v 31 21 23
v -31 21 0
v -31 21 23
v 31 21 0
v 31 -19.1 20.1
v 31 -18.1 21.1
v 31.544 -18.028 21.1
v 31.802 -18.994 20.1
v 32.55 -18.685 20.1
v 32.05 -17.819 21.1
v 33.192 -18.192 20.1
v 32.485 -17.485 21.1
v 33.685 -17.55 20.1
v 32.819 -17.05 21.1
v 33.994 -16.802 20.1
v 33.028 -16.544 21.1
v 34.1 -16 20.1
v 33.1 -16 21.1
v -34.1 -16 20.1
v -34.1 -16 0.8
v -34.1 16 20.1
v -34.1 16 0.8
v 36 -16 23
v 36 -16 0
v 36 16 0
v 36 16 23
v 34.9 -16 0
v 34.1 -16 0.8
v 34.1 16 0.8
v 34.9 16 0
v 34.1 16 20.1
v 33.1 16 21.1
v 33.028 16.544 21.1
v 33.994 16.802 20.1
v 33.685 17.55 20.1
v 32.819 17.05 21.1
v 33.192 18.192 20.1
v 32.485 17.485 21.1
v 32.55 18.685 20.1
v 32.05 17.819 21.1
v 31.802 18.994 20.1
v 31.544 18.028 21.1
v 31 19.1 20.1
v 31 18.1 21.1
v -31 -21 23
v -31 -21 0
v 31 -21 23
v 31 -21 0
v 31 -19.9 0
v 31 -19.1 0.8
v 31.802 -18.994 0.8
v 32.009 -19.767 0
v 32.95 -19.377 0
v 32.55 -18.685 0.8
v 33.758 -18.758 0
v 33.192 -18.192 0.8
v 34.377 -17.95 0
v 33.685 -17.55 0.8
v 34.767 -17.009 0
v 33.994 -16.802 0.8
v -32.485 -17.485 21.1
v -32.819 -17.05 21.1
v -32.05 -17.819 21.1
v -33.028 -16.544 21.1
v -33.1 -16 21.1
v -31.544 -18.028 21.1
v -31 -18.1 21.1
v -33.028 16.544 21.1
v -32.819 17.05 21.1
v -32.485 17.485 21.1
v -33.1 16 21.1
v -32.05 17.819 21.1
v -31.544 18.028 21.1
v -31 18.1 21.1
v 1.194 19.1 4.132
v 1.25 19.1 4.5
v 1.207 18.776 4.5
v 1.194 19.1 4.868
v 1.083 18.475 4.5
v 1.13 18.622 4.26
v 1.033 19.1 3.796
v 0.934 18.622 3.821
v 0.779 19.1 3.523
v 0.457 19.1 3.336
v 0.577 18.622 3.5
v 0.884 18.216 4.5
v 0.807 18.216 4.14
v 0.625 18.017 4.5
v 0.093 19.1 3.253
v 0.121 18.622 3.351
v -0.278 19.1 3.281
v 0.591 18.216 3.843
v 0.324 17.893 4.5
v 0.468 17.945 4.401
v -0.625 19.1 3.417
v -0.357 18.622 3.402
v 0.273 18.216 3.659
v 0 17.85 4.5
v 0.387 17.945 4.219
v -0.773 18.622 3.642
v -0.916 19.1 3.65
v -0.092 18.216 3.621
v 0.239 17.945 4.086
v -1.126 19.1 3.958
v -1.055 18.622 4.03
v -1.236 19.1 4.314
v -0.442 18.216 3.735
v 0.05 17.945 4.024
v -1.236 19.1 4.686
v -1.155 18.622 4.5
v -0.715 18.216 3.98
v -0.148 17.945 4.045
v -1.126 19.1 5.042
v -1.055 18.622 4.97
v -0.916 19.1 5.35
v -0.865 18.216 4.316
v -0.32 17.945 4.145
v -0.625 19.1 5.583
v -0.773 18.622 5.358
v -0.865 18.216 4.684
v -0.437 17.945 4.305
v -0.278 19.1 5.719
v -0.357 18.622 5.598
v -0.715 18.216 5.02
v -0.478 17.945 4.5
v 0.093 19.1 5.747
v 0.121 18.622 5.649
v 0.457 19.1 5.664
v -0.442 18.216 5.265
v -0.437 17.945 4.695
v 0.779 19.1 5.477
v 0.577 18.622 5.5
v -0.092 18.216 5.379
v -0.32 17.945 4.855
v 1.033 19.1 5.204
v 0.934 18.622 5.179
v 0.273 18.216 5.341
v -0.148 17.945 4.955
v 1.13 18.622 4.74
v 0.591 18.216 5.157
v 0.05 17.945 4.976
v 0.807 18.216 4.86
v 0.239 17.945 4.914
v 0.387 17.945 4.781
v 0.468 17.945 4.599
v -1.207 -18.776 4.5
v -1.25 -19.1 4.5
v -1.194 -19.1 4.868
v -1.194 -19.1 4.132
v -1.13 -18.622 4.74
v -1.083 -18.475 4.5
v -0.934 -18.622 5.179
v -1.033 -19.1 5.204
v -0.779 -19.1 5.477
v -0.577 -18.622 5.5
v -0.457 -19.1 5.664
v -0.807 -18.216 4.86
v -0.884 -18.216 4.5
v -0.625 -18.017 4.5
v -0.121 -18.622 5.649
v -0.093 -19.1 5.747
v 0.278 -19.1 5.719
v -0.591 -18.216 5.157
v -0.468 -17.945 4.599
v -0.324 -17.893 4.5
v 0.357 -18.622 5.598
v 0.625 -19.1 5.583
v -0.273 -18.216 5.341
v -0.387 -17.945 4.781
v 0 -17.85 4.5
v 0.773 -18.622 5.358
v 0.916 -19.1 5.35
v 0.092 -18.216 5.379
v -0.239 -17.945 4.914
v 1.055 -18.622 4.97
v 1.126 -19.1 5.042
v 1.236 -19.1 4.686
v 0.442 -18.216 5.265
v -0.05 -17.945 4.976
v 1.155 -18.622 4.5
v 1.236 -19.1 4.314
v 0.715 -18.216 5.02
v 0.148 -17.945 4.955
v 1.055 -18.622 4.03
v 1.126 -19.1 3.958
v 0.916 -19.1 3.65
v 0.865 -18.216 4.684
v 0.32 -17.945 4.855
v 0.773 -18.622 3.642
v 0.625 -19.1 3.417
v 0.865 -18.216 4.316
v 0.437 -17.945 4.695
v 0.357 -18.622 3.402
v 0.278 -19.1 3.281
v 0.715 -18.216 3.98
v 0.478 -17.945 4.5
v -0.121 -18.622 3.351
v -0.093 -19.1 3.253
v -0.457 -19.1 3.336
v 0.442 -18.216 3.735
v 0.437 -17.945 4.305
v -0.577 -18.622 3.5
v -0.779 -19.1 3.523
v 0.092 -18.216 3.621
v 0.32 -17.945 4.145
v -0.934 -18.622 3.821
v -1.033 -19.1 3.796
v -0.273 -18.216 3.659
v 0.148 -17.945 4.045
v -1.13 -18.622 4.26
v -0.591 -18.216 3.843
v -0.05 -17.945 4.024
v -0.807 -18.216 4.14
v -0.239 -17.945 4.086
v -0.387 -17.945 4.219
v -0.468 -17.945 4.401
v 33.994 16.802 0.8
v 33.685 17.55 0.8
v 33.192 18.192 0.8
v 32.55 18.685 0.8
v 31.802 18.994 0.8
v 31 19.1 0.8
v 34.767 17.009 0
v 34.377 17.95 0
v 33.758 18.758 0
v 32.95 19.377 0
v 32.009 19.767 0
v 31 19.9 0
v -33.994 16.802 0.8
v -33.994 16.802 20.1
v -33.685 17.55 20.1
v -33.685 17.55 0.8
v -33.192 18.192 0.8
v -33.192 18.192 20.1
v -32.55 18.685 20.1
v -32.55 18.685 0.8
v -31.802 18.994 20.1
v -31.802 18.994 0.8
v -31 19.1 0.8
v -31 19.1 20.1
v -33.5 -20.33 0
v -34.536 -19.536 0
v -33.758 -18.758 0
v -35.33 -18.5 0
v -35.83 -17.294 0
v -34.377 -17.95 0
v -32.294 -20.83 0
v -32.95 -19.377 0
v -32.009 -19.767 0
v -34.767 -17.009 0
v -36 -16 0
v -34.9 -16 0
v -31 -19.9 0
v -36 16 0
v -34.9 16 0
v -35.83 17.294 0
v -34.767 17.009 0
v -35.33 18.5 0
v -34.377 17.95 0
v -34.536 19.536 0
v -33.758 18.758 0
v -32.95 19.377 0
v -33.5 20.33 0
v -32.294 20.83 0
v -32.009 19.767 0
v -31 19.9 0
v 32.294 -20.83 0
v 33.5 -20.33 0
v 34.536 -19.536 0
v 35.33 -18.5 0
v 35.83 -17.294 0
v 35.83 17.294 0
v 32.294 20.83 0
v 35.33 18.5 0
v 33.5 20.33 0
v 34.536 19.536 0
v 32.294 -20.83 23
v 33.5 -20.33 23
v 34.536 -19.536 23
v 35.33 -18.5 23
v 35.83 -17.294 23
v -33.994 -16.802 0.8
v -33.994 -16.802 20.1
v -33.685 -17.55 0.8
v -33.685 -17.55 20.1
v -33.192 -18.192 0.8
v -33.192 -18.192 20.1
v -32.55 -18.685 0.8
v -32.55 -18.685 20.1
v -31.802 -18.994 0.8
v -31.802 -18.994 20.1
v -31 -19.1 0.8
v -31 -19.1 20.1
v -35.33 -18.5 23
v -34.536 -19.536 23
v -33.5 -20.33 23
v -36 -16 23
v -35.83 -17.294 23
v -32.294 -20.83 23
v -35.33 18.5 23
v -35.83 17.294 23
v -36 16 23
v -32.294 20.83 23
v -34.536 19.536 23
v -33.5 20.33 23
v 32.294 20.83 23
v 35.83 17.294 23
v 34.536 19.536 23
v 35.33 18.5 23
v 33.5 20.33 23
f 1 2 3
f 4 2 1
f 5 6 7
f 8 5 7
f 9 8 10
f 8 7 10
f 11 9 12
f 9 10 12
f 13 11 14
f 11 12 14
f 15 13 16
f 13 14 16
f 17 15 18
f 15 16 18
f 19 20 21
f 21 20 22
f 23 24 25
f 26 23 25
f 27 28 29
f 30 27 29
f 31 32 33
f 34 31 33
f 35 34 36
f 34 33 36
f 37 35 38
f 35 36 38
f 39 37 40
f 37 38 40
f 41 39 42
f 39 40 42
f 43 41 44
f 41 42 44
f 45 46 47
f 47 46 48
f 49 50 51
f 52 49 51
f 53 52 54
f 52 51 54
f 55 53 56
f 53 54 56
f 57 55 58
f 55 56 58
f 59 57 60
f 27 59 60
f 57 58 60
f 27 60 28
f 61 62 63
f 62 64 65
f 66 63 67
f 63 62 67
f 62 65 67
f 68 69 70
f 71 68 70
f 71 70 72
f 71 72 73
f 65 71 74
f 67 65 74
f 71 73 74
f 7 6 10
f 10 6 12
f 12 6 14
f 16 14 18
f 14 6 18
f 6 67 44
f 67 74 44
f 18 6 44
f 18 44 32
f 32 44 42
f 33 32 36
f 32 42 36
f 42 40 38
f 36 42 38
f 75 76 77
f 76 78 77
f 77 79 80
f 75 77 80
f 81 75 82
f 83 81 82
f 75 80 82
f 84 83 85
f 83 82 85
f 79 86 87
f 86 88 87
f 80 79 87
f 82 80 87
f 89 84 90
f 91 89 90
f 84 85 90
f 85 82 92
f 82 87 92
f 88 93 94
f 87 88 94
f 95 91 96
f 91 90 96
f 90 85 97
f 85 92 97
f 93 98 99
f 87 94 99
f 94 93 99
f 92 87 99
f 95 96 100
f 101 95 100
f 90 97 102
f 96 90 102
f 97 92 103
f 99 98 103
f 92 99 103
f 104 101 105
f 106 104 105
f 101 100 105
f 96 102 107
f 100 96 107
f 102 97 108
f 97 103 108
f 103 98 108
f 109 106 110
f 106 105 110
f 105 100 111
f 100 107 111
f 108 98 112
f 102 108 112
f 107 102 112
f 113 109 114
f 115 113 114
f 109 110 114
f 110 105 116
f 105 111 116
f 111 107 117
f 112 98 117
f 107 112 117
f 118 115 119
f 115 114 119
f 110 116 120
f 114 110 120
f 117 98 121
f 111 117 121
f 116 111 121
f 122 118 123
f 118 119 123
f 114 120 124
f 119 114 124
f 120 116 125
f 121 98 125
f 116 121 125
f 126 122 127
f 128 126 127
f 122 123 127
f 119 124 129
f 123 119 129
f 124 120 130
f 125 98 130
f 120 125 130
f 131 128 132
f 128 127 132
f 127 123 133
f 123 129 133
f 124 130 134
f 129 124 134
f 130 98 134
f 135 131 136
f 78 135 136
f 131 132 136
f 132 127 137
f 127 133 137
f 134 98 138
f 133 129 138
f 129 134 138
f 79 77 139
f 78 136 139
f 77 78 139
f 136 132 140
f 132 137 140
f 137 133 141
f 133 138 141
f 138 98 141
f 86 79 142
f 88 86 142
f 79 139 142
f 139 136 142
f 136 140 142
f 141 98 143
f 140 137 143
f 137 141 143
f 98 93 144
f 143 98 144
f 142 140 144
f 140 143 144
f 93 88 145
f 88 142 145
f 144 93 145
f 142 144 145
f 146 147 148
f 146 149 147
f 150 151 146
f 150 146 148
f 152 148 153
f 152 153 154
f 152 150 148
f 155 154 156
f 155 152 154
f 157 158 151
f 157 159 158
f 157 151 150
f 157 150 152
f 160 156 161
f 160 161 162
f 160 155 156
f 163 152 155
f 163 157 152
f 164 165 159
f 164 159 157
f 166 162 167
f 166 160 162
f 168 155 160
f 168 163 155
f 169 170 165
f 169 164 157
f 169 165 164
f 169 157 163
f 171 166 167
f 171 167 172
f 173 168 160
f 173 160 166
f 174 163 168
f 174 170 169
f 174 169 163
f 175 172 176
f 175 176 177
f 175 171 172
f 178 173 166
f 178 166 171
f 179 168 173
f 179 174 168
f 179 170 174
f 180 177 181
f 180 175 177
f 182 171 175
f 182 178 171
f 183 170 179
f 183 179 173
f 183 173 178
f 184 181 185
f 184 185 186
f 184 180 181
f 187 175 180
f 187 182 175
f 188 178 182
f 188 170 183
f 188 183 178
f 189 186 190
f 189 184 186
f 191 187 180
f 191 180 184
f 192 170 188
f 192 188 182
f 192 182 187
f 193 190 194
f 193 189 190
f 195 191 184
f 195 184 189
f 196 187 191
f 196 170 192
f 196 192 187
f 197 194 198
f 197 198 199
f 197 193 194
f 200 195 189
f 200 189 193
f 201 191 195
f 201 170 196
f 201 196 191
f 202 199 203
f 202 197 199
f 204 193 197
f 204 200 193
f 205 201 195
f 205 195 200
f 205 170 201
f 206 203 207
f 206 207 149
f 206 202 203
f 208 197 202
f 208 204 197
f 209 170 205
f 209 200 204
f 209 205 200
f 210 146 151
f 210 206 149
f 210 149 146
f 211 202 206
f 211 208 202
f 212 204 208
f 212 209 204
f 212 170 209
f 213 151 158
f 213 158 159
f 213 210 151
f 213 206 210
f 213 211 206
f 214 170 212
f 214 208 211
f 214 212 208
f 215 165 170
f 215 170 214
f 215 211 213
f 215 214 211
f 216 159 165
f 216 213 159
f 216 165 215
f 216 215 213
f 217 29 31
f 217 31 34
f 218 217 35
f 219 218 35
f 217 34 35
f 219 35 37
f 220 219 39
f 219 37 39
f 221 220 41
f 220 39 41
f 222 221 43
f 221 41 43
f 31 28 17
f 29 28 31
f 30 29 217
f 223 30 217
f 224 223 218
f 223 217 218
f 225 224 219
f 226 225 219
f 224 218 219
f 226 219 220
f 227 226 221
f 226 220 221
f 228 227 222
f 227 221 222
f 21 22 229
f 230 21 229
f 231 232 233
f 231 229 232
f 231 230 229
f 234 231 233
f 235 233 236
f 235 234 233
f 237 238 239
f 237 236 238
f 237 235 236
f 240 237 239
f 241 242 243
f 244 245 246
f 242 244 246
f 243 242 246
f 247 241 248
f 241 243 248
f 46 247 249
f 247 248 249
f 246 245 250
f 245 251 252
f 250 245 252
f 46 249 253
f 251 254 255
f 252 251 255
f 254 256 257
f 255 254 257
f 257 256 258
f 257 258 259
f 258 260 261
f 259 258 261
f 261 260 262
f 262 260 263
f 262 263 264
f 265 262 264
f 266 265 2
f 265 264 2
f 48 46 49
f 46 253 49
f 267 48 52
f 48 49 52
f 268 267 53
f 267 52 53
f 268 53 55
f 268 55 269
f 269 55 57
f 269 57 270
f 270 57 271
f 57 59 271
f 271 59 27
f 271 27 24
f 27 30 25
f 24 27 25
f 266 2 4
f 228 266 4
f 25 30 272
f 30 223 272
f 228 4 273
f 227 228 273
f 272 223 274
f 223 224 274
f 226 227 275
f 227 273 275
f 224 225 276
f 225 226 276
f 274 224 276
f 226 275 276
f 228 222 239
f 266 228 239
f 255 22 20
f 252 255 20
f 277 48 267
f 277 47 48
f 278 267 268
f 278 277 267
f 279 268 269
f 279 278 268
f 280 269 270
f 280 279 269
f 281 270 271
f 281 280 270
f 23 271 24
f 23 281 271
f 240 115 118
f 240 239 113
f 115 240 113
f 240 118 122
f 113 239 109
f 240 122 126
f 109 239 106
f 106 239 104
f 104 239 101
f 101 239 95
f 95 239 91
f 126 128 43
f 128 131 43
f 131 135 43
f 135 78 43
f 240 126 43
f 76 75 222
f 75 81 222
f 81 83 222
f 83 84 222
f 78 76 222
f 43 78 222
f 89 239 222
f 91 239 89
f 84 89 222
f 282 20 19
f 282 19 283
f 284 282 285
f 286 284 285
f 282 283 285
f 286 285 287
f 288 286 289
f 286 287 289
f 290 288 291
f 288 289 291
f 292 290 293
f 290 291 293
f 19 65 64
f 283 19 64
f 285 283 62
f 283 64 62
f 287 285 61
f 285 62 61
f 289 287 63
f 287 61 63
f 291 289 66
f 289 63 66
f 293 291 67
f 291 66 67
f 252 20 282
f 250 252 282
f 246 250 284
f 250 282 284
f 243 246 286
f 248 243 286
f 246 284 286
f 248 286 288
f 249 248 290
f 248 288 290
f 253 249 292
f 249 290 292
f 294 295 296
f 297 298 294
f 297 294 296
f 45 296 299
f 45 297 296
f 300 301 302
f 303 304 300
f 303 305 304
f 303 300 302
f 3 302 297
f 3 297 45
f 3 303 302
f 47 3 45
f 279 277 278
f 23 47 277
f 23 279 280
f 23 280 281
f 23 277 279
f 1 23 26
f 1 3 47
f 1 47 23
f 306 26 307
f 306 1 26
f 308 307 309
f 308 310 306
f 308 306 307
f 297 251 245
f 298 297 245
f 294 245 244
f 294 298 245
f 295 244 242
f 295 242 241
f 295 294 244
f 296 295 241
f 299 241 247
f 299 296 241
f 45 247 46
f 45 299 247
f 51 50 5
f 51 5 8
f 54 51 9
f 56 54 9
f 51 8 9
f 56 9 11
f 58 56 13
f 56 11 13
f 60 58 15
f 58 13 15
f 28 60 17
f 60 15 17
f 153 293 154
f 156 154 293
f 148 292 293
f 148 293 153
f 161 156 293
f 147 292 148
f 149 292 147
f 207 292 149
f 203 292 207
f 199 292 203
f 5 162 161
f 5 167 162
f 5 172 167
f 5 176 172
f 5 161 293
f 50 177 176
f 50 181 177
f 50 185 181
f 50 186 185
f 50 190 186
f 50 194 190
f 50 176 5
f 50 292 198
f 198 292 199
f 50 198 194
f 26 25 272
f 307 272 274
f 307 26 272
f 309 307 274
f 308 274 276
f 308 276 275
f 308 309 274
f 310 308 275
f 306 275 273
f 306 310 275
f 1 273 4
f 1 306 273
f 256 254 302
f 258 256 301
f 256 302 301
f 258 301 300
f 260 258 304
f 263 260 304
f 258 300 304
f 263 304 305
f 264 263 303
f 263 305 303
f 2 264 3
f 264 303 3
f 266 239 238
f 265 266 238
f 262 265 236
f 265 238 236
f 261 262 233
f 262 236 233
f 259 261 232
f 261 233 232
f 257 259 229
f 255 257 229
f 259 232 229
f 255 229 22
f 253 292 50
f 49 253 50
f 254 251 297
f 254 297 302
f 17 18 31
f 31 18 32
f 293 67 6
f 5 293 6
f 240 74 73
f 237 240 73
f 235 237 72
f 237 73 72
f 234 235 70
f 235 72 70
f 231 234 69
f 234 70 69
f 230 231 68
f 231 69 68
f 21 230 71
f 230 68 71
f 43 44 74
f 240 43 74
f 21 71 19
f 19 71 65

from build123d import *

# Parameters (mm, degrees)
F0_W     = 72
F0_H     = 42
F1_DEPTH = 23
F2_R     = 5
F3_T     = -1.9
F4_SIZE  = 0.8
F5_SIZE  = 1


with BuildPart() as f1:
    # F0 (on Top) → F1 (new body)
    with BuildSketch(Plane.XY):
        Rectangle(F0_W, F0_H)
    extrude(amount=F1_DEPTH)

    # F2
    f2_edges = [f1.edges().sort_by_distance(p)[0] for p in [
        (-36, -21, 11.5),
        (36, -21, 11.5),
        (36, 21, 11.5),
        (-36, 21, 11.5),
    ]]
    fillet(f2_edges, radius=F2_R)

    # F3
    f3_openings = [f1.faces().sort_by_distance(p)[0] for p in [
        (0, 0, 0),
    ]]
    offset(amount=F3_T, openings=f3_openings)

    # F4
    f4_edges = [f1.edges().sort_by_distance(p)[0] for p in [
        (34.1, 0, 0),
        (33.192031, -18.192031, 0),
        (0, -19.1, 0),
        (-33.192031, -18.192031, 0),
        (-34.1, 0, 0),
        (-33.192031, 18.192031, 0),
        (0, 19.1, 0),
        (33.192031, 18.192031, 0),
    ]]
    chamfer(f4_edges, length=F4_SIZE)

    # F5
    f5_edges = [f1.edges().sort_by_distance(p)[0] for p in [
        (34.1, 0, 21.1),
        (33.192031, 18.192031, 21.1),
        (0, 19.1, 21.1),
        (-33.192031, 18.192031, 21.1),
        (-34.1, 0, 21.1),
        (-33.192031, -18.192031, 21.1),
        (0, -19.1, 21.1),
        (33.192031, -18.192031, 21.1),
    ]]
    chamfer(f5_edges, length=F5_SIZE)

    # F7 (on offset) → F8 (revolve)
    with BuildSketch(Plane(origin=(0, 0, 4.5), x_dir=(1, 0, 0), z_dir=(0, 0, -1))):
        with BuildLine():
            Line((0, -19.1), (1.25, -19.1))
            ThreePointArc((1.25, -19.1), (0.8838834765, -18.2161165235), (0, -17.85))
            Line((0, -17.85), (0, -19.1))
        make_face()
        with BuildLine():
            Line((0, 19.1), (-1.25, 19.1))
            ThreePointArc((-1.25, 19.1), (-0.8838834765, 18.2161165235), (0, 17.85))
            Line((0, 17.85), (0, 19.1))
        make_face()
    revolve(axis=Axis((0, 18.475, 4.5), (0, 1, 0)))


solid = f1.part
